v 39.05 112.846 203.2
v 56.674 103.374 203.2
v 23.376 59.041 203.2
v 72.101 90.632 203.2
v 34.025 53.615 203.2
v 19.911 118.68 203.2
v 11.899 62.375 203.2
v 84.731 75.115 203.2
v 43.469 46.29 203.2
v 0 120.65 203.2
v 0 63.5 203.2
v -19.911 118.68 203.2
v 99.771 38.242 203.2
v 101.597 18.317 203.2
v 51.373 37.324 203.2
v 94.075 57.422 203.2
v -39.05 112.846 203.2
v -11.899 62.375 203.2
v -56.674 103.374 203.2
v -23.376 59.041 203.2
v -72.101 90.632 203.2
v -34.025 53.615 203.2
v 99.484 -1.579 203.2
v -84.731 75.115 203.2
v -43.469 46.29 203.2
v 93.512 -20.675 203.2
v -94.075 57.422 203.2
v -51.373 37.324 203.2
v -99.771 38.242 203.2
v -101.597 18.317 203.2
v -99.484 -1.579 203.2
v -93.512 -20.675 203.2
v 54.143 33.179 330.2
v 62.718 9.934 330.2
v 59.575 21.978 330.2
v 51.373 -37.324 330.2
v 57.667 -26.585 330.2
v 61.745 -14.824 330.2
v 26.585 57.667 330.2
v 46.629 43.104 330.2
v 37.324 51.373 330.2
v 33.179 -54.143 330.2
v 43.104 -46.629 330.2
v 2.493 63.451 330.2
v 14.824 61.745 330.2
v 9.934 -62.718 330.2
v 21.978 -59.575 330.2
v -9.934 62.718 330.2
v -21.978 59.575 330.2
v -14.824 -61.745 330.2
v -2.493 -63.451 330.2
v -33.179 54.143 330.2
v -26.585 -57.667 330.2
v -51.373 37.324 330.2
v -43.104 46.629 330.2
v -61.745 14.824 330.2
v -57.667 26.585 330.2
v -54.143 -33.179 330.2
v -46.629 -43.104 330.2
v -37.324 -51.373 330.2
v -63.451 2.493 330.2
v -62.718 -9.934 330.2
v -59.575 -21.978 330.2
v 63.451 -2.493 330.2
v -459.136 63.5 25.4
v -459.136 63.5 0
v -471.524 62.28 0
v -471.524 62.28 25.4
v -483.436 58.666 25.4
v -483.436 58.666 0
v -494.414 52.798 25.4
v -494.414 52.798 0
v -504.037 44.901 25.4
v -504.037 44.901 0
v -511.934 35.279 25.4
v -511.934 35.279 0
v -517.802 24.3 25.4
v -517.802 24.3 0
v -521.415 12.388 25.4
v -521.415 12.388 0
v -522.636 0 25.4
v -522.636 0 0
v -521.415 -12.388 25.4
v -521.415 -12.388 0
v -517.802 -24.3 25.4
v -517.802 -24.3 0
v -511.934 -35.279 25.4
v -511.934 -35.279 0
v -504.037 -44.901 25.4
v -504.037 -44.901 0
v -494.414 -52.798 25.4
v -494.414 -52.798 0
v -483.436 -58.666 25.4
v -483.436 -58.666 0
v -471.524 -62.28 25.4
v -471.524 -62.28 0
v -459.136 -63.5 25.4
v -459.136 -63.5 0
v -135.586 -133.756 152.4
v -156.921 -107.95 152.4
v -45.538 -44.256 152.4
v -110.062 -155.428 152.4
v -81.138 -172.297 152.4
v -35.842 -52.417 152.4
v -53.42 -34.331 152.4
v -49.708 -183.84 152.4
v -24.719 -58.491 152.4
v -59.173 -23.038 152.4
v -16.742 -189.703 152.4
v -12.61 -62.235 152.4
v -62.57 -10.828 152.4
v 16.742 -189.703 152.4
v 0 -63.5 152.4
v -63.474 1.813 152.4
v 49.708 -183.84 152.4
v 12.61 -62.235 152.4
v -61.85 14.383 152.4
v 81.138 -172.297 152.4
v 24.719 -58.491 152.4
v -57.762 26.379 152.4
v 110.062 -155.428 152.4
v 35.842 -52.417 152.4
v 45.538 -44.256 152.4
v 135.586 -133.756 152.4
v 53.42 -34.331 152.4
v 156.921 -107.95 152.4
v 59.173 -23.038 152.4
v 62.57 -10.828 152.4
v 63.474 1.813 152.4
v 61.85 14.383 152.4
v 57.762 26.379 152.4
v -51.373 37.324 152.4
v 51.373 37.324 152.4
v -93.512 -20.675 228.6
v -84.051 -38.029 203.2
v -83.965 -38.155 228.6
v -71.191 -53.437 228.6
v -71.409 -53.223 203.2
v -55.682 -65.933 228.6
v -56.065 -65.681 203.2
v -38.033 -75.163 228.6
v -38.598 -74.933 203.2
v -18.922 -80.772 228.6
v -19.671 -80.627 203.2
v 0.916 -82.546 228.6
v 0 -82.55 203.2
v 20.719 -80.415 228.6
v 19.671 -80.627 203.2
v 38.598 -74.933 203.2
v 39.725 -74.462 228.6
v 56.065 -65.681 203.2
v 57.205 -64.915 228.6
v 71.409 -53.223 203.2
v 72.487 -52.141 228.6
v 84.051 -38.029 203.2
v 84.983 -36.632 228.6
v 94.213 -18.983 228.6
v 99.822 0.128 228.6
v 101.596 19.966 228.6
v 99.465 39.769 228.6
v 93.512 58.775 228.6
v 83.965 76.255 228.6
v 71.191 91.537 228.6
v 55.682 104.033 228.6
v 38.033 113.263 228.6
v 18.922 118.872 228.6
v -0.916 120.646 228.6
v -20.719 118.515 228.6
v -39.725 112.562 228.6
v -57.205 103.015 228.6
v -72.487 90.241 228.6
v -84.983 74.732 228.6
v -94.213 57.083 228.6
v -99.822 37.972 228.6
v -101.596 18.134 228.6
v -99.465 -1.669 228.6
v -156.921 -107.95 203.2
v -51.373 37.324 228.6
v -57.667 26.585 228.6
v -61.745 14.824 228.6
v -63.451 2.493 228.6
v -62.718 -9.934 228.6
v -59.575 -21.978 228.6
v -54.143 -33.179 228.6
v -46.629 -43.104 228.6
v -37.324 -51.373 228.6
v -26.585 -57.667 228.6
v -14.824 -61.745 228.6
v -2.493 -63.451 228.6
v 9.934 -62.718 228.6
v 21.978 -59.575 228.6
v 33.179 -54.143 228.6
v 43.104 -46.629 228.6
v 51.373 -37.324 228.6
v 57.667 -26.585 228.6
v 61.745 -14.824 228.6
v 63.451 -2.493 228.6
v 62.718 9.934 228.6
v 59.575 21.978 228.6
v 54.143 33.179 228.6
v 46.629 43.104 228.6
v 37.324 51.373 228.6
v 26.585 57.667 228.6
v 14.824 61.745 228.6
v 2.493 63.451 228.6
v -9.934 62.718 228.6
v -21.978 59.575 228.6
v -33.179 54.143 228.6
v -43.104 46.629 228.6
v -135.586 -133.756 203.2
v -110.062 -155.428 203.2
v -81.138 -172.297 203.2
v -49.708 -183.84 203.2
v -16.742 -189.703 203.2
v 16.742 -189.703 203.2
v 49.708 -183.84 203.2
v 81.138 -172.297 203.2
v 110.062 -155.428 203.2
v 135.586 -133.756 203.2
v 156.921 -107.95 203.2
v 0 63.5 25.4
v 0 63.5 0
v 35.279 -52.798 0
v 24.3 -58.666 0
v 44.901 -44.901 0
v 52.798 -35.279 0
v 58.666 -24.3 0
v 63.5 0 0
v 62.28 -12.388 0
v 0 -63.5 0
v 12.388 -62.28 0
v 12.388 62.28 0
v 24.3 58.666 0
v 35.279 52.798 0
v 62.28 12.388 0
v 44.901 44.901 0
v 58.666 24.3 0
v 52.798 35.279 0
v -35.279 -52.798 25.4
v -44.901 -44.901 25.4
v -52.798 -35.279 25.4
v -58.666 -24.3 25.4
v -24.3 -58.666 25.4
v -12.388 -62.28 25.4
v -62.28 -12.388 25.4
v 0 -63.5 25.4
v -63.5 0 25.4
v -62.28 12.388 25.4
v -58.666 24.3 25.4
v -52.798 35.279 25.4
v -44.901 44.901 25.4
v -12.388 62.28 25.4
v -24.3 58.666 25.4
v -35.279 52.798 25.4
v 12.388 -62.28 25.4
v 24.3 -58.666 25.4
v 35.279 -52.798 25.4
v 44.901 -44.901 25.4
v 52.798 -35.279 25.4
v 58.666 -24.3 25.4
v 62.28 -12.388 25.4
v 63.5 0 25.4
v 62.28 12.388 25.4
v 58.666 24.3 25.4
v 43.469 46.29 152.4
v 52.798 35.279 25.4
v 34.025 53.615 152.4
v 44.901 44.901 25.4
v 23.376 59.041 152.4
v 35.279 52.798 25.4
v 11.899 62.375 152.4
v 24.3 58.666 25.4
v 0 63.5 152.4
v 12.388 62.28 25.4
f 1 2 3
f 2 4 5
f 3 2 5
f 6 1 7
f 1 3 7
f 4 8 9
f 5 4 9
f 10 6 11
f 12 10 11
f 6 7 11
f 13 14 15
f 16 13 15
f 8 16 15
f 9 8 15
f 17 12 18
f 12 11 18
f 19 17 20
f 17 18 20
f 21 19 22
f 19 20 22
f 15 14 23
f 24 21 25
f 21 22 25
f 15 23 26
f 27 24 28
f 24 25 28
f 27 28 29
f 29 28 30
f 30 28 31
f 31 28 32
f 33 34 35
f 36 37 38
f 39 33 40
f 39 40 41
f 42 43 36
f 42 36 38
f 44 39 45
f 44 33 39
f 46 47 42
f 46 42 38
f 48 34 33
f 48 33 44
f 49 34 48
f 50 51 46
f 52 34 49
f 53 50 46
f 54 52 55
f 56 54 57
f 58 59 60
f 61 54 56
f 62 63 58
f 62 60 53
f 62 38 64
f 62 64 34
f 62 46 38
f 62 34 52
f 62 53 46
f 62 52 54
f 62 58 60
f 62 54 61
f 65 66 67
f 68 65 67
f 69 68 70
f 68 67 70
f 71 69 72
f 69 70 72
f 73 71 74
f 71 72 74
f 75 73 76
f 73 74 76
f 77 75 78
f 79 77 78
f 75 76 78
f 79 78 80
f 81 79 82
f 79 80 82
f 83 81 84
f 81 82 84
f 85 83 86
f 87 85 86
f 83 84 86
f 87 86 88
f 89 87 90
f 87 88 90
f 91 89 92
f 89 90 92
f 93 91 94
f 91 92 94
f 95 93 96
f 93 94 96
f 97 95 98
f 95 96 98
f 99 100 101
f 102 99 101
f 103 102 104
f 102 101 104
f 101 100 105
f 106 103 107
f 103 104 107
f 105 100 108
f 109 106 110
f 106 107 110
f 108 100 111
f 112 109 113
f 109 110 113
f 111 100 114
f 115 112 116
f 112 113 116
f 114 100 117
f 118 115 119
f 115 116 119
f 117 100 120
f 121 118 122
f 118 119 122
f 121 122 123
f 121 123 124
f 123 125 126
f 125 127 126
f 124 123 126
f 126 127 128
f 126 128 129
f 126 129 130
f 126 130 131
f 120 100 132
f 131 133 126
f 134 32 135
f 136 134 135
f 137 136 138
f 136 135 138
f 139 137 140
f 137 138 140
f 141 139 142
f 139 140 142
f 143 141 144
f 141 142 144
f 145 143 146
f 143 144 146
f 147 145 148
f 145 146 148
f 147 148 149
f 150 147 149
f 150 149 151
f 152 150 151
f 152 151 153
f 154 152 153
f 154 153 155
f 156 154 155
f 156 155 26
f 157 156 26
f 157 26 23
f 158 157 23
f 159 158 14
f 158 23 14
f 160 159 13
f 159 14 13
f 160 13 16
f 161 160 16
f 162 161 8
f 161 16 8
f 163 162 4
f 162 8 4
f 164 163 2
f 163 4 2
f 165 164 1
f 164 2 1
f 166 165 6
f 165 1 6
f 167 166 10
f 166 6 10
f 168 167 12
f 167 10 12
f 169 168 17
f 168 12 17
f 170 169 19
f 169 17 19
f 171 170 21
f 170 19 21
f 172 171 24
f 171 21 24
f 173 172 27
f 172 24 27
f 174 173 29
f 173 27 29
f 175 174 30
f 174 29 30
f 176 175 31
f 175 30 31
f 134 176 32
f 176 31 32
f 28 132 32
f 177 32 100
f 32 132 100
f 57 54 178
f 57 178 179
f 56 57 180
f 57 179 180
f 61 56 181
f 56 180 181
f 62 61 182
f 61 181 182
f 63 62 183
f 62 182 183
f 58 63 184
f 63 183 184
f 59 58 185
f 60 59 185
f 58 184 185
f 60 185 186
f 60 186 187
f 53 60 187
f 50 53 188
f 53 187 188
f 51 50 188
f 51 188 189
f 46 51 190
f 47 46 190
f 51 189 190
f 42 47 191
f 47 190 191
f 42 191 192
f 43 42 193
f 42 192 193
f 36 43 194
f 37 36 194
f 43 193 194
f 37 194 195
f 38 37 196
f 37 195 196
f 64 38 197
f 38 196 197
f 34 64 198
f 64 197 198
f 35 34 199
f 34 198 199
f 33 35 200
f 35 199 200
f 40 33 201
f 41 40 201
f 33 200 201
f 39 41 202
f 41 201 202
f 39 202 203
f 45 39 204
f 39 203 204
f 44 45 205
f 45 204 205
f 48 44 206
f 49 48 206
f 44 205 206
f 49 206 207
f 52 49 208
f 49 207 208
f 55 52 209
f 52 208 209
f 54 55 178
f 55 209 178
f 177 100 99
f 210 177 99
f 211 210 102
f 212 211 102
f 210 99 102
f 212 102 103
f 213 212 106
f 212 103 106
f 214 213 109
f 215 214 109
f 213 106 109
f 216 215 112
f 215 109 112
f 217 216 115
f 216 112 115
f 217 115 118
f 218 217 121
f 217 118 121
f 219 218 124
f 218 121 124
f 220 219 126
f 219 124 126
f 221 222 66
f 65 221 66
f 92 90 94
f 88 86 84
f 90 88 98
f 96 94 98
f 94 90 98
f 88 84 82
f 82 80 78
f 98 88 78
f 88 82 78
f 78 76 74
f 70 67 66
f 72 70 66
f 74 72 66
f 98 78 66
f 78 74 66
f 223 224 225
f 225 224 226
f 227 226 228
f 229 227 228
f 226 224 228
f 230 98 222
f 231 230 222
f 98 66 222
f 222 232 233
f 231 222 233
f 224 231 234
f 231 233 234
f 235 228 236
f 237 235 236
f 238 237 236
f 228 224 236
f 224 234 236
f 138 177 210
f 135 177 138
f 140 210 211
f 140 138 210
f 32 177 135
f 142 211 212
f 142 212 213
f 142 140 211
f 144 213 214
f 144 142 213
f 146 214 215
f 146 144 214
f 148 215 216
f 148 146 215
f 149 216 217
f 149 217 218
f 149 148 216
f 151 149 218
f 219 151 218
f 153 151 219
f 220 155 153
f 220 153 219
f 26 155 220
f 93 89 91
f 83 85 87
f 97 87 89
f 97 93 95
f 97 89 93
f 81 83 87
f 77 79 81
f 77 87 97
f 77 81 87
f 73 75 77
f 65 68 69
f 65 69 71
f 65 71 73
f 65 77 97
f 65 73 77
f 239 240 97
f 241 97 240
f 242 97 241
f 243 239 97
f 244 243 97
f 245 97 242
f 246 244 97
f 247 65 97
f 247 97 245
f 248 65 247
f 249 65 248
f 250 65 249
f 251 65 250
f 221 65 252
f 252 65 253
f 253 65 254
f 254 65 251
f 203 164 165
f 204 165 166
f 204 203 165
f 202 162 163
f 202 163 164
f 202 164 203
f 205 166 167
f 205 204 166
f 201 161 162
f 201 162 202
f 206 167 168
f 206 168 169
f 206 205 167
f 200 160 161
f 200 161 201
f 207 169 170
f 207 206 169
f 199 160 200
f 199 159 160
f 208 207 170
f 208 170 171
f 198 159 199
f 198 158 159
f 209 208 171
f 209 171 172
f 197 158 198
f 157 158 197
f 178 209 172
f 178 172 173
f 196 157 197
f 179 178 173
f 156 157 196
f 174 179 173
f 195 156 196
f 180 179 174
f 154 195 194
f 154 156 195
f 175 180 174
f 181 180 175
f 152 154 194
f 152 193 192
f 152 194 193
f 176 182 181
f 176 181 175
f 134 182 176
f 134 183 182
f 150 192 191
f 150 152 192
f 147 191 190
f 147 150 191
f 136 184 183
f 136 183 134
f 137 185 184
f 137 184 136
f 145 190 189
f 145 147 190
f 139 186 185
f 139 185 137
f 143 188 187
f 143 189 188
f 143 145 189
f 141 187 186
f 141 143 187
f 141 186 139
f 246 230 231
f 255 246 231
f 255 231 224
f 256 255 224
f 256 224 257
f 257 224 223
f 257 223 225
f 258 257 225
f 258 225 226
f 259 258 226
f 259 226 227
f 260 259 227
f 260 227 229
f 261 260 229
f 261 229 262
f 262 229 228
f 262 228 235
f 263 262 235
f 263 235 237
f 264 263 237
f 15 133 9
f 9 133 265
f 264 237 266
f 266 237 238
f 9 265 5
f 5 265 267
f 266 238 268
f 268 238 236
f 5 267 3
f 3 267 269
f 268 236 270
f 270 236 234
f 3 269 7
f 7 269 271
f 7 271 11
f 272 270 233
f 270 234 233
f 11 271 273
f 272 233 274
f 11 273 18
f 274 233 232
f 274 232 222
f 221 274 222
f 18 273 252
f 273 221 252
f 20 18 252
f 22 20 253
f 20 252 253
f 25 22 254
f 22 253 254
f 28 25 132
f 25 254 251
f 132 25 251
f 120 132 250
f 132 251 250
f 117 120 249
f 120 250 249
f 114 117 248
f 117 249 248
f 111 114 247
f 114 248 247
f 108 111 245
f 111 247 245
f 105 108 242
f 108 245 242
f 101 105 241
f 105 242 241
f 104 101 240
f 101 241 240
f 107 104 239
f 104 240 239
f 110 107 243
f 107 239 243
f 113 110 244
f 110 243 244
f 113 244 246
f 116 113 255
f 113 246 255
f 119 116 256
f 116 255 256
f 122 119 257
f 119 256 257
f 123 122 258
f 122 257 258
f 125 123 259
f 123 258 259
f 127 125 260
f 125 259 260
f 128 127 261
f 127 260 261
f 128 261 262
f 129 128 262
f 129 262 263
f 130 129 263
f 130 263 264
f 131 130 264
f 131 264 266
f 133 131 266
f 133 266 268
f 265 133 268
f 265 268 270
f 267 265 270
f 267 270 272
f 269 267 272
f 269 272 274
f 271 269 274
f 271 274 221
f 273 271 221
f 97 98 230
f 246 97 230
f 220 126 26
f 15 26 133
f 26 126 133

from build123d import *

# Parameters (mm, degrees)
BOSS_EXTRUDE1_DEPTH = 25.4
SKETCH3_R           = 63.5
BOSS_EXTRUDE2_DEPTH = 127
BOSS_EXTRUDE3_DEPTH = 50.8
SKETCH5_R           = 101.6
BOSS_EXTRUDE4_DEPTH = 25.4
SKETCH6_R           = 63.5
BOSS_EXTRUDE5_DEPTH = 101.6


with BuildPart() as part:
    # Sketch2 → Boss-Extrude1 (new body)
    with BuildSketch(Plane.XY):
        with BuildLine():
            Line((0, 63.5), (-459.135608438, 63.5))
            ThreePointArc((-459.135608438, 63.5), (-522.635608438, 0), (-459.135608438, -63.5))
            Line((-459.135608438, -63.5), (0, -63.5))
            ThreePointArc((0, -63.5), (63.5, 0), (0, 63.5))
        make_face()
    extrude(amount=BOSS_EXTRUDE1_DEPTH)

    # Sketch3 → Boss-Extrude2 (add)
    with BuildSketch(Plane.XY.offset(25.4)):
        with Locations(Location((0, 0, 0), (0, 0, 90))):
            Circle(SKETCH3_R)
    extrude(amount=BOSS_EXTRUDE2_DEPTH)

    # Sketch4 → Boss-Extrude3 (add)
    with BuildSketch(Plane.XY.offset(152.4)):
        with BuildLine():
            Line((-51.372579143, 37.324363521), (-156.920582469, -107.95))
            ThreePointArc((-156.920582469, -107.95), (0, -190.439904187), (156.920582469, -107.95))
            Line((156.920582469, -107.95), (51.372579143, 37.324363521))
            ThreePointArc((51.372579143, 37.324363521), (0, 63.5), (-51.372579143, 37.324363521))
        make_face()
    extrude(amount=BOSS_EXTRUDE3_DEPTH)

    # Sketch5 → Boss-Extrude4 (add)
    with BuildSketch(Plane.XY.offset(203.2)):
        with Locations(Location((0, 19.05, 0), (0, 0, 203.016562949))):
            Circle(SKETCH5_R)
    extrude(amount=BOSS_EXTRUDE4_DEPTH)

    # Sketch6 → Boss-Extrude5 (add)
    with BuildSketch(Plane.XY.offset(228.6)):
        with Locations(Location((0, 0, 0), (0, 0, 144))):
            Circle(SKETCH6_R)
    extrude(amount=BOSS_EXTRUDE5_DEPTH)


solid = part.part
